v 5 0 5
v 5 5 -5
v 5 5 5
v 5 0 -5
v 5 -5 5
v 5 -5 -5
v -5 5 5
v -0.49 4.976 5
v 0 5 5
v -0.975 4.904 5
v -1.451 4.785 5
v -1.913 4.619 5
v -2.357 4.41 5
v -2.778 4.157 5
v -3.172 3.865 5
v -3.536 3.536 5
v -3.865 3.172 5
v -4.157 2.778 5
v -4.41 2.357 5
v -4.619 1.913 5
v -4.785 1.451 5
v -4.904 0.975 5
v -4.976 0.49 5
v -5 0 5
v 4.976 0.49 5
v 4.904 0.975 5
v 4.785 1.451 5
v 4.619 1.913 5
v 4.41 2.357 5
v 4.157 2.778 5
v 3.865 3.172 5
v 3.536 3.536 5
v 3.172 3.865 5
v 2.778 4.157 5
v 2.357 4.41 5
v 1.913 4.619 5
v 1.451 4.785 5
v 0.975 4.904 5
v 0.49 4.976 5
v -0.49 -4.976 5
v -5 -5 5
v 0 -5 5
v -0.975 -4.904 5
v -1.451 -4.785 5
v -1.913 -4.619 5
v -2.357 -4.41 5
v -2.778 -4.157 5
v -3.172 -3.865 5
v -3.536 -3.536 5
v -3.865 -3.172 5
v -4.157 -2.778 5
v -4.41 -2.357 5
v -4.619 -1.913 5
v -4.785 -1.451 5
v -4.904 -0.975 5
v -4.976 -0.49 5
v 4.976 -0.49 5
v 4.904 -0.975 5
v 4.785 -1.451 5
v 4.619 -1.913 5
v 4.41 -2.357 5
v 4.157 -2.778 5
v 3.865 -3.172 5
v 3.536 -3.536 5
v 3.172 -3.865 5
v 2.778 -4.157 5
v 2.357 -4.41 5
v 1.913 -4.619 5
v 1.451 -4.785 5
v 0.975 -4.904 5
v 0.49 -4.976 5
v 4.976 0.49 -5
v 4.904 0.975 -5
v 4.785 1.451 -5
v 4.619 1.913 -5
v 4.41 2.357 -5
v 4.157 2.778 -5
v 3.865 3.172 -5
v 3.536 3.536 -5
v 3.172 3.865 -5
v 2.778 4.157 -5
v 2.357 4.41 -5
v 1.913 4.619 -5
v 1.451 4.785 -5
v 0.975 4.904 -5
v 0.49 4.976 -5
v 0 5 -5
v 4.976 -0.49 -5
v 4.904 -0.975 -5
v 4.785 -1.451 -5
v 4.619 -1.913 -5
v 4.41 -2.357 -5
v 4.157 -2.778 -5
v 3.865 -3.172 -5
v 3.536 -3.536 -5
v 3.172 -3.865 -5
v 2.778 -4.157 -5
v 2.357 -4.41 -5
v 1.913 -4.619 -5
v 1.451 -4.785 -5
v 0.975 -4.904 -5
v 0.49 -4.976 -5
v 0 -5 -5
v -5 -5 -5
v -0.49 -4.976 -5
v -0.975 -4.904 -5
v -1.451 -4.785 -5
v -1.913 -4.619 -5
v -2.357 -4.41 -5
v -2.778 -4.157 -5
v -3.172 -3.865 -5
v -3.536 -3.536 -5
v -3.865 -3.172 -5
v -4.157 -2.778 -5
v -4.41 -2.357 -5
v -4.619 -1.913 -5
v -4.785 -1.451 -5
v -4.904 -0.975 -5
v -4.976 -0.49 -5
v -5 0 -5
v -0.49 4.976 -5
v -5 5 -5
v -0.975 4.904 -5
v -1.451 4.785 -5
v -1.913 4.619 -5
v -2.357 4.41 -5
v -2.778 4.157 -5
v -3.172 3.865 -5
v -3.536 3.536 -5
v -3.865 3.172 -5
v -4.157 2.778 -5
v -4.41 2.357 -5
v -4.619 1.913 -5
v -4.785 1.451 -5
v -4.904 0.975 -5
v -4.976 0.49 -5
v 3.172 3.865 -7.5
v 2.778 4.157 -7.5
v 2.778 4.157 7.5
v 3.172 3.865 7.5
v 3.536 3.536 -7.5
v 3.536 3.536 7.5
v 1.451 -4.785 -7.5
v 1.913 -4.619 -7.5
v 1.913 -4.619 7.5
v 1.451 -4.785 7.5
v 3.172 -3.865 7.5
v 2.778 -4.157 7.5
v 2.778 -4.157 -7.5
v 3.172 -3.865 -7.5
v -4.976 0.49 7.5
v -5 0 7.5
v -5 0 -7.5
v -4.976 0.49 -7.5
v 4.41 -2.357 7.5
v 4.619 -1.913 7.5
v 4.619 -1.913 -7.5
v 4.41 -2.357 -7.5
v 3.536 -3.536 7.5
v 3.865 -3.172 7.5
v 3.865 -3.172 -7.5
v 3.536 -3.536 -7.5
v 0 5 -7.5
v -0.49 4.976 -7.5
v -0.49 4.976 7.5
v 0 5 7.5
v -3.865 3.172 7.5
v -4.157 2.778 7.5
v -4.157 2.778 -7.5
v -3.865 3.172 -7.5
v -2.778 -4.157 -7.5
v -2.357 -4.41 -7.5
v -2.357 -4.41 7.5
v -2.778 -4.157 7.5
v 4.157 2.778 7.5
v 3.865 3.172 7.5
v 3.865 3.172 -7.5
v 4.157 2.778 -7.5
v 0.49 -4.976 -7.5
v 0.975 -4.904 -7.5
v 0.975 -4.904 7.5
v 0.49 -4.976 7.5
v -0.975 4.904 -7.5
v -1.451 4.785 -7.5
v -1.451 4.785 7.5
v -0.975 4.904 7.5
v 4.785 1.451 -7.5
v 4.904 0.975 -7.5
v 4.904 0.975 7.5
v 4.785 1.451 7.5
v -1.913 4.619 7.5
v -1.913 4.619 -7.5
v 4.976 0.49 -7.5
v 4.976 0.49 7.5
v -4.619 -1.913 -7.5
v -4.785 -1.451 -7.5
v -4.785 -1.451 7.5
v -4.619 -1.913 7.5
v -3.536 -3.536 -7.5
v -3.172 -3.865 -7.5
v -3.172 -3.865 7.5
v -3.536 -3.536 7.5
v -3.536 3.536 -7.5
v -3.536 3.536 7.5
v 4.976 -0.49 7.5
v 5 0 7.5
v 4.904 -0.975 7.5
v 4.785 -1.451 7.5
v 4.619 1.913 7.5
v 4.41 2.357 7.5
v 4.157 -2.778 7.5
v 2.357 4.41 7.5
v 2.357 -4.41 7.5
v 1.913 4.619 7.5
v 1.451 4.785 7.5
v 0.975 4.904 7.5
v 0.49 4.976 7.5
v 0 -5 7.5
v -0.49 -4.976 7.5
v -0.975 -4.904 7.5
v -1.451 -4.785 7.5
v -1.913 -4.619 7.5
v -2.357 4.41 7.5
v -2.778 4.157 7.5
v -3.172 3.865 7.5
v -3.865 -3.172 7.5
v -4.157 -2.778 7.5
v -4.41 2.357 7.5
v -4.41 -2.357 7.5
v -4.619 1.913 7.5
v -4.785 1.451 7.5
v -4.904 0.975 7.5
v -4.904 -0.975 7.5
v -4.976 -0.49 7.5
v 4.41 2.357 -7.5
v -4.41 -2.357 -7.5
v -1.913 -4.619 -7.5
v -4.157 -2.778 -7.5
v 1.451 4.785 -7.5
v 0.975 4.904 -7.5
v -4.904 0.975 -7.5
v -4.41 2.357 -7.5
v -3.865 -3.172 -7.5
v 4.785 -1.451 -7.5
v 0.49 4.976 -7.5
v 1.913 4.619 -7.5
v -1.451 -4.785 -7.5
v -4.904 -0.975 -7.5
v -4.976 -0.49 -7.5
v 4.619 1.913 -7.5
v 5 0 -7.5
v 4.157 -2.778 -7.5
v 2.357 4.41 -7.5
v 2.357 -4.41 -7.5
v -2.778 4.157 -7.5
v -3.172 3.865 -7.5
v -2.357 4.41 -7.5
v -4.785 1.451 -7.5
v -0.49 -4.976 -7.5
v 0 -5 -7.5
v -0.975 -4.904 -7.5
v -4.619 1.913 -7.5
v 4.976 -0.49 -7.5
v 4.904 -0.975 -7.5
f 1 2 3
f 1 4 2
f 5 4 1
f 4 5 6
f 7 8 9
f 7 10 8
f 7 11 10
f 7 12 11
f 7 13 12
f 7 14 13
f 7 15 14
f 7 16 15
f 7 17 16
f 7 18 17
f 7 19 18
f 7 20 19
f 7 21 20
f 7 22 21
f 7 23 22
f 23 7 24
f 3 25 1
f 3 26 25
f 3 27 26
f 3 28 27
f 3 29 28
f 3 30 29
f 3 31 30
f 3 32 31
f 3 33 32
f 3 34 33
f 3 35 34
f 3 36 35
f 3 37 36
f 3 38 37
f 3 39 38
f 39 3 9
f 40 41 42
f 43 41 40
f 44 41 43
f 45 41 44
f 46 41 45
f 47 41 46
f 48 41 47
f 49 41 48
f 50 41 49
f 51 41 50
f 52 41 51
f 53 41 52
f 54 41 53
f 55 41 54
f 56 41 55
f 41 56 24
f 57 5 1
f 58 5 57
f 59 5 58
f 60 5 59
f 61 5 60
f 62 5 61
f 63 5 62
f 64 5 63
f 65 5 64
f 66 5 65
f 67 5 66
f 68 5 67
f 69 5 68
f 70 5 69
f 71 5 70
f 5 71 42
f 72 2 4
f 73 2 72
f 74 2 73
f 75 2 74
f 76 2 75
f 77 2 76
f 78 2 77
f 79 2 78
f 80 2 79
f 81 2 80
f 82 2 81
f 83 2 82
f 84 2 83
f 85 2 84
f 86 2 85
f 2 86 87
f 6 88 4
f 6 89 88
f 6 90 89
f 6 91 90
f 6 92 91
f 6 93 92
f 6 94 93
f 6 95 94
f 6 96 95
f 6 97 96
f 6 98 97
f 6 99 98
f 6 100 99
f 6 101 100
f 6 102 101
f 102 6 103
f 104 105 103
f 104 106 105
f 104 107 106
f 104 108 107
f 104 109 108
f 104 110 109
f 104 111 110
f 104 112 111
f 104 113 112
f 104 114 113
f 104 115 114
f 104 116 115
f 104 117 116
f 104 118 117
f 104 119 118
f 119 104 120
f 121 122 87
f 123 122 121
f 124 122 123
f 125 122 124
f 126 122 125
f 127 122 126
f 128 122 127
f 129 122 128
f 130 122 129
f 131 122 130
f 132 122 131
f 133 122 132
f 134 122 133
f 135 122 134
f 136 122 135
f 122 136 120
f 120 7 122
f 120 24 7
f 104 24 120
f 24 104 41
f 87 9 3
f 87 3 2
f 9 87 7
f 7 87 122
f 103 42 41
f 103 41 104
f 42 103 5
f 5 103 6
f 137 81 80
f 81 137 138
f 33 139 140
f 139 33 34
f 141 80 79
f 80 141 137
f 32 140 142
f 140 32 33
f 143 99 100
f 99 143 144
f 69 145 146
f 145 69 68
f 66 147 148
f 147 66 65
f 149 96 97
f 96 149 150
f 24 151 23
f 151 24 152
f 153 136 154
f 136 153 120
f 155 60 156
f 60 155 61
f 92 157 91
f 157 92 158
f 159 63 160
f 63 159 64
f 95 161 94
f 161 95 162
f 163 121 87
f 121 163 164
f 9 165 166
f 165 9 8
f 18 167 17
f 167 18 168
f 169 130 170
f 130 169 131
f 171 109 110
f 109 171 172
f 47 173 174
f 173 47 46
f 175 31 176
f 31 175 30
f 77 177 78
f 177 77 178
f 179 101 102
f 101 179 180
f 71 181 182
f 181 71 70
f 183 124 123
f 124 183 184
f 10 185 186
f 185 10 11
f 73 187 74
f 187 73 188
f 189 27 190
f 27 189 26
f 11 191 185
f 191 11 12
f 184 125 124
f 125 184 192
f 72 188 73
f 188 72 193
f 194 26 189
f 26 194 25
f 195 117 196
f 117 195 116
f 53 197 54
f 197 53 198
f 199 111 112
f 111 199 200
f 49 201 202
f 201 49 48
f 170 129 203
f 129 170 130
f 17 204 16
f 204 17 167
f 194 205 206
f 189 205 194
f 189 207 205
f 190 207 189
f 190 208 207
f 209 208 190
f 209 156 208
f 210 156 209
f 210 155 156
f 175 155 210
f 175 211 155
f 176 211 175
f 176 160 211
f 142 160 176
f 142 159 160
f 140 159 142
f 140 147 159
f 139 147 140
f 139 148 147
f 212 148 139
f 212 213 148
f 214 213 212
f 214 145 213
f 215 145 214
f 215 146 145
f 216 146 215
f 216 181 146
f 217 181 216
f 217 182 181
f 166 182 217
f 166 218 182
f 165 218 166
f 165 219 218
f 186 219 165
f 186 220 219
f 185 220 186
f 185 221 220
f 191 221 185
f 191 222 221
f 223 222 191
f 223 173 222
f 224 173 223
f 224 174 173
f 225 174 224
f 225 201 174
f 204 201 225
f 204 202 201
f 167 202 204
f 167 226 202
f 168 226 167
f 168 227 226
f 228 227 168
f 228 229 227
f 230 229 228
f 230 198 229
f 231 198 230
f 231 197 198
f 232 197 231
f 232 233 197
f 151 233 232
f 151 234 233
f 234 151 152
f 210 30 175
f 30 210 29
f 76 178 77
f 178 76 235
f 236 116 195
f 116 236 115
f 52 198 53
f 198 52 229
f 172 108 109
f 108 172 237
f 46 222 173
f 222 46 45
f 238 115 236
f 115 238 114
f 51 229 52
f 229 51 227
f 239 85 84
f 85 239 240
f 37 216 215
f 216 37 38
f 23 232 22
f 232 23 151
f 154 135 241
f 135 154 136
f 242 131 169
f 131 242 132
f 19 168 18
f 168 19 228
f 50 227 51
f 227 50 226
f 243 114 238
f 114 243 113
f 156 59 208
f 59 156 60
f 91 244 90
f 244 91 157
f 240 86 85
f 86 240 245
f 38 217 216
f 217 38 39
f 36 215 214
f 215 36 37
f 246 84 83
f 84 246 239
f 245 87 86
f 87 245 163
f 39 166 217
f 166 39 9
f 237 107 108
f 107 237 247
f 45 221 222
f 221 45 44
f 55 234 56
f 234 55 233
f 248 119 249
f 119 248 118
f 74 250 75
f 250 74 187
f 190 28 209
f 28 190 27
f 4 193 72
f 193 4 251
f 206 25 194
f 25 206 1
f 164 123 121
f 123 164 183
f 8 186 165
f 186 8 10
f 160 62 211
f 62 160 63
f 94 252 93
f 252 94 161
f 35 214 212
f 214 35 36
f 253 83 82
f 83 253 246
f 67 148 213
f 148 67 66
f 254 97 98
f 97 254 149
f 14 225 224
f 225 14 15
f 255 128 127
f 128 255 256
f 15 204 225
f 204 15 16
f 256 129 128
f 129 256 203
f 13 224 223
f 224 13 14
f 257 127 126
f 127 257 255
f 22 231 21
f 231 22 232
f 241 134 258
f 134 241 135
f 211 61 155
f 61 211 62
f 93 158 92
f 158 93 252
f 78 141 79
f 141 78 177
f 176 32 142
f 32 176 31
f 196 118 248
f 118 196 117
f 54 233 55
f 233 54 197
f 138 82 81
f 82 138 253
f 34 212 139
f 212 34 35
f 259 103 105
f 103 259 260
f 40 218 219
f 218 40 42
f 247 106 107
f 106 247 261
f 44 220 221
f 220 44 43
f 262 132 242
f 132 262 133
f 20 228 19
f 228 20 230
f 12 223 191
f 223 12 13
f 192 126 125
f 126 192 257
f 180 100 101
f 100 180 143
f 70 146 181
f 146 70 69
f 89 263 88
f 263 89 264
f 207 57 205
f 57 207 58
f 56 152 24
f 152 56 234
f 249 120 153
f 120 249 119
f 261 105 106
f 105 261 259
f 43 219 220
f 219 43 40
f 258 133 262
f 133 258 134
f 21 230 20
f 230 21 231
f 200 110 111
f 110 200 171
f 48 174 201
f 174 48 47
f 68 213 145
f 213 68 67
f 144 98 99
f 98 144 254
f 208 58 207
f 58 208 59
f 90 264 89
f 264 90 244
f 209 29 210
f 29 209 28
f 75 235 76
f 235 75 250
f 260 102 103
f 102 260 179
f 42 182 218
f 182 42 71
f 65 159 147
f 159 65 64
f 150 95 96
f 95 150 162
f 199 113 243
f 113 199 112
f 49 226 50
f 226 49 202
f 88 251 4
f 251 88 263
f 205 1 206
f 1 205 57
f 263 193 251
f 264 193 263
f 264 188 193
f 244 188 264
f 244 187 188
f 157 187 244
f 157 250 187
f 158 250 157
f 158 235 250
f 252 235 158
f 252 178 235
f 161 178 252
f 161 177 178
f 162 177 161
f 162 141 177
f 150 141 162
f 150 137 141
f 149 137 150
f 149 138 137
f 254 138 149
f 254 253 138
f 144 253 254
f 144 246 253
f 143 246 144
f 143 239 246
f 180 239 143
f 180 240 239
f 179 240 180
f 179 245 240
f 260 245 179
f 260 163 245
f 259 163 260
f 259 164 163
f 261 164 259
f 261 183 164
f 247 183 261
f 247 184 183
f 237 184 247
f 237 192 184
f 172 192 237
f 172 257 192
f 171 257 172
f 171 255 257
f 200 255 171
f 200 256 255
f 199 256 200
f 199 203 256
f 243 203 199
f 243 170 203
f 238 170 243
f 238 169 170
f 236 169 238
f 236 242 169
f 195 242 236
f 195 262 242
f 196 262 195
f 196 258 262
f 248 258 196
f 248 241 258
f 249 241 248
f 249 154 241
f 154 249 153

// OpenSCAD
// Set fragment number for roundings
$fn = $preview ? 32 : 64;

// Size of the Cube (all directions)
cuSize = 10;

// The diameter of the Cylinder
cyDia = 10;

// The height of the Cylinder
cyHei = 15;

// Z-Rotation of the Cylinder
rZ = 45;

// Create Cube and rotate Cylinder by 'rZ'
// Rotation around Z-Axis does nothing
// Because the Cylinder is round
cube(size = [cuSize, cuSize, cuSize], center = true);
rotate([0, 0, rZ])
    cylinder(d = cyDia, h = cyHei, center = true);
